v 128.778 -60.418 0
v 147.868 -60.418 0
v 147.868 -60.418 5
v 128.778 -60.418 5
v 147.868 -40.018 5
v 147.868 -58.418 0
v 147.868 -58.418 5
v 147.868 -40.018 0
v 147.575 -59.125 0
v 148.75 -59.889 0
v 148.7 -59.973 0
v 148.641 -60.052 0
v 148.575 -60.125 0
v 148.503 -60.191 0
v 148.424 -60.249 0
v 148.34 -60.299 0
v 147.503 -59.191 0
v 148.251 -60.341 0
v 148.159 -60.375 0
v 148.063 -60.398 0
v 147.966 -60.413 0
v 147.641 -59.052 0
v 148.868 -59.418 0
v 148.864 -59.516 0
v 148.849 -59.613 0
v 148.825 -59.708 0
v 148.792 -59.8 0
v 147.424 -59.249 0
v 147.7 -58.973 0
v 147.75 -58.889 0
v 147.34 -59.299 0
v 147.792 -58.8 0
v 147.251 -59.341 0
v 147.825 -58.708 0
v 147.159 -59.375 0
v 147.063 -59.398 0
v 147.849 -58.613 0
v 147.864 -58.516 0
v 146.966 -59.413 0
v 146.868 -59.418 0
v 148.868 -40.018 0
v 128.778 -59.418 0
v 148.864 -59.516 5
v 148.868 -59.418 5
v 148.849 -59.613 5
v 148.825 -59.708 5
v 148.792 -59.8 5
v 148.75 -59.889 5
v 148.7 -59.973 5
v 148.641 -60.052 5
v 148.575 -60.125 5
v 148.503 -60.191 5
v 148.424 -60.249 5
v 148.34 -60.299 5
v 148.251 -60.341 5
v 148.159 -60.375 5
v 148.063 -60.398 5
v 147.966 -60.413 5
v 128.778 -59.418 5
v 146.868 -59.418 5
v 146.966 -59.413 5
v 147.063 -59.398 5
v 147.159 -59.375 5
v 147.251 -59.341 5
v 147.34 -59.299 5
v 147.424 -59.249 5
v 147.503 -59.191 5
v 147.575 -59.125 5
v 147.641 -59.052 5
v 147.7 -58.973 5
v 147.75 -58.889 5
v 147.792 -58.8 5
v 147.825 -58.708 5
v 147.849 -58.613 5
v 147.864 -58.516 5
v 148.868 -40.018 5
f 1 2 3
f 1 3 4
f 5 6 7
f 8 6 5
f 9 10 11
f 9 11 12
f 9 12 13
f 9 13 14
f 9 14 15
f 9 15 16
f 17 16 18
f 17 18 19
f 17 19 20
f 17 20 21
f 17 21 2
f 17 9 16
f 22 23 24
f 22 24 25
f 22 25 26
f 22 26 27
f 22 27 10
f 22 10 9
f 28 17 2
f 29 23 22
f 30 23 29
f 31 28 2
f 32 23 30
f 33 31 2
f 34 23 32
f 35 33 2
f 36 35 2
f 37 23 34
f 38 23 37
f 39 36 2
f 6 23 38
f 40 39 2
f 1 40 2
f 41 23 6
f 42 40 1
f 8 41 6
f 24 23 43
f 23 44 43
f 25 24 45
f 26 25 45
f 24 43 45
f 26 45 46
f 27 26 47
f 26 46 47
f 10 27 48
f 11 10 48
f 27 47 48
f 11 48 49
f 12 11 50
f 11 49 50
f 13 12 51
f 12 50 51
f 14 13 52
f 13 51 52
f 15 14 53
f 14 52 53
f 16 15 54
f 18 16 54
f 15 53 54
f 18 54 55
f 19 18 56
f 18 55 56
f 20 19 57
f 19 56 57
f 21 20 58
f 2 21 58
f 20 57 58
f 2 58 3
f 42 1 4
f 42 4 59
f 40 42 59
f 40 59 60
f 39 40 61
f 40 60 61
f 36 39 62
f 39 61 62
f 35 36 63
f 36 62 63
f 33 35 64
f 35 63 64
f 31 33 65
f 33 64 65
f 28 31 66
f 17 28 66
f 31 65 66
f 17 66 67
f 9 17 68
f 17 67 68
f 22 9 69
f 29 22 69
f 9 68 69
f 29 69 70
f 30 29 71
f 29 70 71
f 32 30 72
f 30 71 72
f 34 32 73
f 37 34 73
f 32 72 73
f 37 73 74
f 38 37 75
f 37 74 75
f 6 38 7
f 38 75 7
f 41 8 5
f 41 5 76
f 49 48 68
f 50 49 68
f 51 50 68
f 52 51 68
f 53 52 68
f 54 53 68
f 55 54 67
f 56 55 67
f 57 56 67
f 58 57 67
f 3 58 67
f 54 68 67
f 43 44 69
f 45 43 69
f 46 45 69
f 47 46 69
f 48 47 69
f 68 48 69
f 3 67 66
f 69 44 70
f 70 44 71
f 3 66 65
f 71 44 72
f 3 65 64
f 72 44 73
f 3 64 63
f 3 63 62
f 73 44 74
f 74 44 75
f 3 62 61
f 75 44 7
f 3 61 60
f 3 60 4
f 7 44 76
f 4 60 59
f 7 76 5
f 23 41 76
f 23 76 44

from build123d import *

# Parameters (mm, degrees)
EKSTR_ZYON_NCE2_DEPTH = 5
RADYUS1_R             = 1


with BuildPart() as part:
    # Çizim1 → Ekstrüzyon-İnce2 (new body)
    with BuildSketch(Plane.XY):
        Polygon((148.868356189, -40.017575671), (148.868356189, -60.417575671), (128.777806905, -60.417575671), (128.777806905, -59.417575671), (147.868356189, -59.417575671), (147.868356189, -40.017575671), align=None)
    extrude(amount=EKSTR_ZYON_NCE2_DEPTH)

    # Radyus1
    radyus1_edges = [part.edges().sort_by_distance(p)[0] for p in [
        (147.868356189, -59.417575671, 2.5),
        (148.868356189, -60.417575671, 2.5),
    ]]
    fillet(radyus1_edges, radius=RADYUS1_R)


solid = part.part
